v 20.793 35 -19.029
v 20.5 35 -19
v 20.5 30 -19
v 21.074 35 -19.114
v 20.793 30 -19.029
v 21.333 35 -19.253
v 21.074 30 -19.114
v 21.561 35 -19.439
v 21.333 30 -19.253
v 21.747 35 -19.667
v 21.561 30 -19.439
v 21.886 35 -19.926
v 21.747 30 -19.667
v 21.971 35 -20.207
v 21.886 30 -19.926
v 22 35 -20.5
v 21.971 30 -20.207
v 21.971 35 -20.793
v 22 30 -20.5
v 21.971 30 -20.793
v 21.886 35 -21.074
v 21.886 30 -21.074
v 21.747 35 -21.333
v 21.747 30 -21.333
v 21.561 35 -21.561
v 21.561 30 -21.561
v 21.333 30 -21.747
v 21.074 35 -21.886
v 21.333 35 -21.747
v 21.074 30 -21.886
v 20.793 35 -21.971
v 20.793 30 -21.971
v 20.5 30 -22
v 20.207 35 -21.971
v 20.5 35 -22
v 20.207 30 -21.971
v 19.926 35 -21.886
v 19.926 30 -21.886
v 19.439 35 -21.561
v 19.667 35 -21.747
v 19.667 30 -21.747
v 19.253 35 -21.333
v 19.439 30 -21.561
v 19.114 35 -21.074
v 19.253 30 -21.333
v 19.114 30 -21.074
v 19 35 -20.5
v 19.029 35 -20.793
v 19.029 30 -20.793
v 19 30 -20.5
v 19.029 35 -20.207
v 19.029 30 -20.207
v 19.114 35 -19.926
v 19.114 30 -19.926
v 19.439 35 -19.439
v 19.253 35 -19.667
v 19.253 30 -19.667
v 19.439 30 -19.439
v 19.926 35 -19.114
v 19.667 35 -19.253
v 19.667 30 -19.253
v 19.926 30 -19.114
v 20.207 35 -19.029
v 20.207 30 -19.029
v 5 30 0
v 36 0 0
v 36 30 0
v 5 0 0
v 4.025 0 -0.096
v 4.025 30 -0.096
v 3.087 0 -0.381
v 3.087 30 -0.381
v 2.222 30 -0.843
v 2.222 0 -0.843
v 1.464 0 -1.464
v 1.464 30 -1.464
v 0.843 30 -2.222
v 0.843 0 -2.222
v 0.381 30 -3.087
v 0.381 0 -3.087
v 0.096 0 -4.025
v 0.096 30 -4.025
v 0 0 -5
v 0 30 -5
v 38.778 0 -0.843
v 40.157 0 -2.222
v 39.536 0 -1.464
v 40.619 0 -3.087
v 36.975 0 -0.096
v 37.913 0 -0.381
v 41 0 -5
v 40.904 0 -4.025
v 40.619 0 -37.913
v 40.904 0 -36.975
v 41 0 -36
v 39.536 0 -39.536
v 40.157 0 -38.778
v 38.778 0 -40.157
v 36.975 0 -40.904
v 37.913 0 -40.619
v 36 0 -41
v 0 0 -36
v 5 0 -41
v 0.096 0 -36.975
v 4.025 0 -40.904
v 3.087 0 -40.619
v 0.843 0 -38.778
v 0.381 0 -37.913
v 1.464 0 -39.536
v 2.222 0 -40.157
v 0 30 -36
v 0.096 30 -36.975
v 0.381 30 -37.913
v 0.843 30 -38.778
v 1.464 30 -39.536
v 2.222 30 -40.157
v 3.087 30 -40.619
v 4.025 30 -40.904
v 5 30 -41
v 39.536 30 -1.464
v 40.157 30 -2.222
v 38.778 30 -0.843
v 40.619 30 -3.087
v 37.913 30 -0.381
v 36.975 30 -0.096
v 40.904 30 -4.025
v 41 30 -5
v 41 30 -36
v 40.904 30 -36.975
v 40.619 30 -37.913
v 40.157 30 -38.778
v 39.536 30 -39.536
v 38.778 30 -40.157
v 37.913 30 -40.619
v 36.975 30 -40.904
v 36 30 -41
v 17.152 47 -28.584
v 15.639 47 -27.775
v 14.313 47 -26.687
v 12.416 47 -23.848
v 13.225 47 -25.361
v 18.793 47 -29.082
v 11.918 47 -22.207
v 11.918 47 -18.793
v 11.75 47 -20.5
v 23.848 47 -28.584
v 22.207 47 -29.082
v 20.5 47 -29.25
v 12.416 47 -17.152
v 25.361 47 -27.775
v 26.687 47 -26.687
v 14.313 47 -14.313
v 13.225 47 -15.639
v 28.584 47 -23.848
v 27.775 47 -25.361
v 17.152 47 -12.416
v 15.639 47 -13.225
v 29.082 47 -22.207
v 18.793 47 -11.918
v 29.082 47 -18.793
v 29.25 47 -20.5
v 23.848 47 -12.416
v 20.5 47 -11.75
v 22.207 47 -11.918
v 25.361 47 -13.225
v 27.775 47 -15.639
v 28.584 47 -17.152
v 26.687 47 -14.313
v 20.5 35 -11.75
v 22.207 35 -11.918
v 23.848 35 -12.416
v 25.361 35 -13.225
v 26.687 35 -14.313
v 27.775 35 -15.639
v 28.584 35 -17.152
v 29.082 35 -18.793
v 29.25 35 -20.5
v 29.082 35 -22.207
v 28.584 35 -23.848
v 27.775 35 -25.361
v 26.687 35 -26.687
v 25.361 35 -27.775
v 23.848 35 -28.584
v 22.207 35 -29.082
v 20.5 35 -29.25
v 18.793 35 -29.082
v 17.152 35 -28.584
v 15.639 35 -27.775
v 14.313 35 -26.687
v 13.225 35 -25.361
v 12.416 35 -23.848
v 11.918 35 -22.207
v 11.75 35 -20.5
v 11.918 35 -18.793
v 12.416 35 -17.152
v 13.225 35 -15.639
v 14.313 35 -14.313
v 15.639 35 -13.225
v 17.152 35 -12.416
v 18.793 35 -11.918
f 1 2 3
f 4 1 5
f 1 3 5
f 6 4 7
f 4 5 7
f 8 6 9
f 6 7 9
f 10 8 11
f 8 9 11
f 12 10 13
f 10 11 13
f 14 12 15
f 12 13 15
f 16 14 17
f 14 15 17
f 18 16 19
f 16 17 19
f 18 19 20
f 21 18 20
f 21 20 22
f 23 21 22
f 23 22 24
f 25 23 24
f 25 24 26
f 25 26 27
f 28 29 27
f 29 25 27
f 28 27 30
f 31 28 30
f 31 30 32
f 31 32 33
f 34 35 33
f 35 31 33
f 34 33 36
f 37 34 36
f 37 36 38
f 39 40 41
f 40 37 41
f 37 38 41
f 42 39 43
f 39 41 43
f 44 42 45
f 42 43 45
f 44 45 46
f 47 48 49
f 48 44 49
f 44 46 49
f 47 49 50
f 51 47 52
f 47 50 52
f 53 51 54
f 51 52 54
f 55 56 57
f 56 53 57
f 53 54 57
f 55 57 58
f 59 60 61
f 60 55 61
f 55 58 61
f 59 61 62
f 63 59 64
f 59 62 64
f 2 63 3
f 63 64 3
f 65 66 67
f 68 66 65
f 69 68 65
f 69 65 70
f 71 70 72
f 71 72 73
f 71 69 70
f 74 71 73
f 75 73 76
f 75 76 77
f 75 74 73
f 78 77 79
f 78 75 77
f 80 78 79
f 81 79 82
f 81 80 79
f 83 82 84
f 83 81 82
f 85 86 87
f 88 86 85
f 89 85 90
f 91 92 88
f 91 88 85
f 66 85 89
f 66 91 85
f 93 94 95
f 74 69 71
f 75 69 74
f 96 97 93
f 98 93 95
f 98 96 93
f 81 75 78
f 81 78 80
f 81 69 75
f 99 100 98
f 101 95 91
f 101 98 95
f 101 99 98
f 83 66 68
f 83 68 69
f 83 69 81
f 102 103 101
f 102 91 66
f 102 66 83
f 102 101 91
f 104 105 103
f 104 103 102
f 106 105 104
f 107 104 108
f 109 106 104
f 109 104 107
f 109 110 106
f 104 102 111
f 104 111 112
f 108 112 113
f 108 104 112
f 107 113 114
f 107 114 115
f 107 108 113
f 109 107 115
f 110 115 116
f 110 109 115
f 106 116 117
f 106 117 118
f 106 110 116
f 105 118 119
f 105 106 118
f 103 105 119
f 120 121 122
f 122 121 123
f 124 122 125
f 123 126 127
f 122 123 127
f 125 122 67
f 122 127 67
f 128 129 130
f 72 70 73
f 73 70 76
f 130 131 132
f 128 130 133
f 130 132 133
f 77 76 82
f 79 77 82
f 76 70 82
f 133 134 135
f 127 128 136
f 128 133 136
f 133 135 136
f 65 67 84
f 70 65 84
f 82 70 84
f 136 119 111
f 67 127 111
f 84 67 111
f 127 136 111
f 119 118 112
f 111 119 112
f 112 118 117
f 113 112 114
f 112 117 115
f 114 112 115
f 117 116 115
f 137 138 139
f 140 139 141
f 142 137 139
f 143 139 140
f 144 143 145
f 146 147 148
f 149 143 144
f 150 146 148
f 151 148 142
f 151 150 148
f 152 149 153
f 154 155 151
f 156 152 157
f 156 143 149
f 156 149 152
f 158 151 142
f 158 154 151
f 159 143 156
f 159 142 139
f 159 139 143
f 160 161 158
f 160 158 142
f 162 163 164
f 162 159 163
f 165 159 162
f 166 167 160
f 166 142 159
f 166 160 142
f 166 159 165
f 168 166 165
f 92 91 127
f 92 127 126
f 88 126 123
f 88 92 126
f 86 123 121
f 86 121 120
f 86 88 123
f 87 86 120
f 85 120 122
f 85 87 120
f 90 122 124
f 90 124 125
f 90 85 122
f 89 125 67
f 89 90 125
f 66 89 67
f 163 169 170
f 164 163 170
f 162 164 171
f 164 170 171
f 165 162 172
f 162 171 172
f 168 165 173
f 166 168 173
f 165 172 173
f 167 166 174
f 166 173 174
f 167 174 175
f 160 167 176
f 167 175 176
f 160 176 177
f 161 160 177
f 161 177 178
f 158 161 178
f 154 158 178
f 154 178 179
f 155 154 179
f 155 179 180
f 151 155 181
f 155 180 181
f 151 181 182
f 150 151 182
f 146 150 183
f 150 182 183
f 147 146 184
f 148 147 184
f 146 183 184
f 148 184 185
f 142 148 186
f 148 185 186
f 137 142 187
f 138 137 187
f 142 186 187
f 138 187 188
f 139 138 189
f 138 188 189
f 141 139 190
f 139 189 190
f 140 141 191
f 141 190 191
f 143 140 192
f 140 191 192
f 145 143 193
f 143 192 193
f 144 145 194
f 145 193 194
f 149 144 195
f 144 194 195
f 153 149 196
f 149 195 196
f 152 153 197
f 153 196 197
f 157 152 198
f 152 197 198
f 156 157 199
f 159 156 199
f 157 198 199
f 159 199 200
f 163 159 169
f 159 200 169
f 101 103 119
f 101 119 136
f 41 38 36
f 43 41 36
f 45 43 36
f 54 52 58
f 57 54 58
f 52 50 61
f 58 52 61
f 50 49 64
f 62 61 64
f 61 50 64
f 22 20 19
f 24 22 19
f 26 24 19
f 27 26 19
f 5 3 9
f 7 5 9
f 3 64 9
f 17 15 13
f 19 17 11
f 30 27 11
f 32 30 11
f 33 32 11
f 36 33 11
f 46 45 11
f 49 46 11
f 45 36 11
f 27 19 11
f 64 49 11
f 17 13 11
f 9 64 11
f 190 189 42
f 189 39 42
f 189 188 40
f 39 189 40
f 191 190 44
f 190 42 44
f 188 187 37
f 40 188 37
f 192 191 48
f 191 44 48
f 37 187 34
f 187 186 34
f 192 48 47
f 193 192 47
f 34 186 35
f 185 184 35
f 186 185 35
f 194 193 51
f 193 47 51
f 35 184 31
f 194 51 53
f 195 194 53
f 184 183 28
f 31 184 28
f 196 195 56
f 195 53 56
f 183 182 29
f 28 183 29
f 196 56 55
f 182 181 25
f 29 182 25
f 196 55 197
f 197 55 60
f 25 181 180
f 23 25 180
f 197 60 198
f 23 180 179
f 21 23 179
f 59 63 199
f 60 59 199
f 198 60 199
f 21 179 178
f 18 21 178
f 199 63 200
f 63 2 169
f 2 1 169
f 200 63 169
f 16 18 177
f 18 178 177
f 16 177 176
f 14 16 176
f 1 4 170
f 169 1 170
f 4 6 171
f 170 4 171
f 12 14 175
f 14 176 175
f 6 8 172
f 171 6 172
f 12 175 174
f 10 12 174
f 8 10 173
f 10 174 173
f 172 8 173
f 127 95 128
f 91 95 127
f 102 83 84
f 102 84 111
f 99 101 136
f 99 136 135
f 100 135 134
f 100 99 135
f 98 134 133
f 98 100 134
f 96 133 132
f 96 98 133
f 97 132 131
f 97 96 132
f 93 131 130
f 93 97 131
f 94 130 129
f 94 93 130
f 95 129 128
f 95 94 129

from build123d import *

# Parameters (mm, degrees)
SALIENTE_EXTRUIR2_DEPTH = 30
CROQUIS3_R              = 1.5
SALIENTE_EXTRUIR3_DEPTH = 17
CROQUIS6_R              = 8.75
SALIENTE_EXTRUIR4_DEPTH = 12


with BuildPart() as part:
    # Croquis2 → Saliente-Extruir2 (new body)
    with BuildSketch(Plane(origin=(0, 0, 0), x_dir=(1, 0, 0), z_dir=(0, 1, 0))):
        with BuildLine():
            Line((5, 41), (36, 41))
            ThreePointArc((36, 41), (39.535533906, 39.535533906), (41, 36))
            Line((41, 36), (41, 5))
            ThreePointArc((41, 5), (39.535533906, 1.464466094), (36, 0))
            Line((36, 0), (5, 0))
            ThreePointArc((5, 0), (1.464466094, 1.464466094), (0, 5))
            Line((0, 5), (0, 36))
            ThreePointArc((0, 36), (1.464466094, 39.535533906), (5, 41))
        make_face()
    extrude(amount=SALIENTE_EXTRUIR2_DEPTH)


with BuildPart() as body_2:
    # Croquis3 → Saliente-Extruir3 (new body)
    with BuildSketch(Plane(origin=(0, 30, 0), x_dir=(1, 0, 0), z_dir=(0, 1, 0))):
        with Locations(Location((20.5, 20.5, 0), (0, 0, 270))):
            Circle(CROQUIS3_R)
    extrude(amount=SALIENTE_EXTRUIR3_DEPTH)

    # Croquis6 → Saliente-Extruir4 (add)
    with BuildSketch(Plane(origin=(0, 35, 0), x_dir=(1, 0, 0), z_dir=(0, 1, 0))):
        with Locations(Location((20.5, 20.5, 0), (0, 0, 270))):
            Circle(CROQUIS6_R)
    extrude(amount=SALIENTE_EXTRUIR4_DEPTH)


solid = Compound([part.part, body_2.part])
